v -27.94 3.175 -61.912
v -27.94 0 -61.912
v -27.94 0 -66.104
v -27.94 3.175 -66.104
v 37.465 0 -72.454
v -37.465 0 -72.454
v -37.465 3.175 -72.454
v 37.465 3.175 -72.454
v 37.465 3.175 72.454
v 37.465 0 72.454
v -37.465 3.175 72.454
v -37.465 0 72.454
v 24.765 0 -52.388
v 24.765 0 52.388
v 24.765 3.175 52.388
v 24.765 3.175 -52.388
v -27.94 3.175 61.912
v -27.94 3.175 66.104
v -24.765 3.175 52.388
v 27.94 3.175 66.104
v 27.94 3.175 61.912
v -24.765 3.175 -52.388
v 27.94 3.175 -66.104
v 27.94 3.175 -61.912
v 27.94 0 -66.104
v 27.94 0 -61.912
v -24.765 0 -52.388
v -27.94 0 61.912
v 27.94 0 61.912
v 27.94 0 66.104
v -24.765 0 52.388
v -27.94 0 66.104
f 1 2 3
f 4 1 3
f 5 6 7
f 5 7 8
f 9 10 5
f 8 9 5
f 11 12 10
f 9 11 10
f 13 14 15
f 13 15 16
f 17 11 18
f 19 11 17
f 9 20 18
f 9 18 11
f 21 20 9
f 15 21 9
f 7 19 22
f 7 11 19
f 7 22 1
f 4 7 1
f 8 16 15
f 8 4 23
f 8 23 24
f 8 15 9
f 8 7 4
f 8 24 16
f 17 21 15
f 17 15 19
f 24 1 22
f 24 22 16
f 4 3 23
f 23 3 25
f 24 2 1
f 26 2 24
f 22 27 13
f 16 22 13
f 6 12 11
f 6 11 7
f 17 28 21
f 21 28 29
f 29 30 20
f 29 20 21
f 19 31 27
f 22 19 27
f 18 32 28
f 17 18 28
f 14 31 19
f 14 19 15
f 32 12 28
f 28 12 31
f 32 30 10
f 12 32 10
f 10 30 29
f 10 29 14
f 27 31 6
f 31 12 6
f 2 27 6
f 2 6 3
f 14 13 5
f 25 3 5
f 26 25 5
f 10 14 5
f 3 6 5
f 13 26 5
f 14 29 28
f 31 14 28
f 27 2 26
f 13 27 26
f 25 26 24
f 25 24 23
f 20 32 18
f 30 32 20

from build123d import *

# Parameters (mm, degrees)
SKETCH1_W           = 74.93
SKETCH1_H           = 144.907
SKETCH1_W_2         = 55.88
SKETCH1_H_2         = 4.191
SKETCH1_W_3         = 49.53
SKETCH1_H_3         = 104.775
BOSS_EXTRUDE1_DEPTH = 3.175


with BuildPart() as part:
    # Sketch1 → Boss-Extrude1 (new body)
    with BuildSketch(Plane(origin=(0, 0, 0), x_dir=(1, 0, 0), z_dir=(0, 1, 0))):
        Rectangle(SKETCH1_W, SKETCH1_H)
        with Locations((0, -64.008)):
            Rectangle(SKETCH1_W_2, SKETCH1_H_2, mode=Mode.SUBTRACT)
        with Locations((0, 64.008)):
            Rectangle(SKETCH1_W_2, SKETCH1_H_2, mode=Mode.SUBTRACT)
        Rectangle(SKETCH1_W_3, SKETCH1_H_3, mode=Mode.SUBTRACT)
    extrude(amount=BOSS_EXTRUDE1_DEPTH)


solid = part.part
